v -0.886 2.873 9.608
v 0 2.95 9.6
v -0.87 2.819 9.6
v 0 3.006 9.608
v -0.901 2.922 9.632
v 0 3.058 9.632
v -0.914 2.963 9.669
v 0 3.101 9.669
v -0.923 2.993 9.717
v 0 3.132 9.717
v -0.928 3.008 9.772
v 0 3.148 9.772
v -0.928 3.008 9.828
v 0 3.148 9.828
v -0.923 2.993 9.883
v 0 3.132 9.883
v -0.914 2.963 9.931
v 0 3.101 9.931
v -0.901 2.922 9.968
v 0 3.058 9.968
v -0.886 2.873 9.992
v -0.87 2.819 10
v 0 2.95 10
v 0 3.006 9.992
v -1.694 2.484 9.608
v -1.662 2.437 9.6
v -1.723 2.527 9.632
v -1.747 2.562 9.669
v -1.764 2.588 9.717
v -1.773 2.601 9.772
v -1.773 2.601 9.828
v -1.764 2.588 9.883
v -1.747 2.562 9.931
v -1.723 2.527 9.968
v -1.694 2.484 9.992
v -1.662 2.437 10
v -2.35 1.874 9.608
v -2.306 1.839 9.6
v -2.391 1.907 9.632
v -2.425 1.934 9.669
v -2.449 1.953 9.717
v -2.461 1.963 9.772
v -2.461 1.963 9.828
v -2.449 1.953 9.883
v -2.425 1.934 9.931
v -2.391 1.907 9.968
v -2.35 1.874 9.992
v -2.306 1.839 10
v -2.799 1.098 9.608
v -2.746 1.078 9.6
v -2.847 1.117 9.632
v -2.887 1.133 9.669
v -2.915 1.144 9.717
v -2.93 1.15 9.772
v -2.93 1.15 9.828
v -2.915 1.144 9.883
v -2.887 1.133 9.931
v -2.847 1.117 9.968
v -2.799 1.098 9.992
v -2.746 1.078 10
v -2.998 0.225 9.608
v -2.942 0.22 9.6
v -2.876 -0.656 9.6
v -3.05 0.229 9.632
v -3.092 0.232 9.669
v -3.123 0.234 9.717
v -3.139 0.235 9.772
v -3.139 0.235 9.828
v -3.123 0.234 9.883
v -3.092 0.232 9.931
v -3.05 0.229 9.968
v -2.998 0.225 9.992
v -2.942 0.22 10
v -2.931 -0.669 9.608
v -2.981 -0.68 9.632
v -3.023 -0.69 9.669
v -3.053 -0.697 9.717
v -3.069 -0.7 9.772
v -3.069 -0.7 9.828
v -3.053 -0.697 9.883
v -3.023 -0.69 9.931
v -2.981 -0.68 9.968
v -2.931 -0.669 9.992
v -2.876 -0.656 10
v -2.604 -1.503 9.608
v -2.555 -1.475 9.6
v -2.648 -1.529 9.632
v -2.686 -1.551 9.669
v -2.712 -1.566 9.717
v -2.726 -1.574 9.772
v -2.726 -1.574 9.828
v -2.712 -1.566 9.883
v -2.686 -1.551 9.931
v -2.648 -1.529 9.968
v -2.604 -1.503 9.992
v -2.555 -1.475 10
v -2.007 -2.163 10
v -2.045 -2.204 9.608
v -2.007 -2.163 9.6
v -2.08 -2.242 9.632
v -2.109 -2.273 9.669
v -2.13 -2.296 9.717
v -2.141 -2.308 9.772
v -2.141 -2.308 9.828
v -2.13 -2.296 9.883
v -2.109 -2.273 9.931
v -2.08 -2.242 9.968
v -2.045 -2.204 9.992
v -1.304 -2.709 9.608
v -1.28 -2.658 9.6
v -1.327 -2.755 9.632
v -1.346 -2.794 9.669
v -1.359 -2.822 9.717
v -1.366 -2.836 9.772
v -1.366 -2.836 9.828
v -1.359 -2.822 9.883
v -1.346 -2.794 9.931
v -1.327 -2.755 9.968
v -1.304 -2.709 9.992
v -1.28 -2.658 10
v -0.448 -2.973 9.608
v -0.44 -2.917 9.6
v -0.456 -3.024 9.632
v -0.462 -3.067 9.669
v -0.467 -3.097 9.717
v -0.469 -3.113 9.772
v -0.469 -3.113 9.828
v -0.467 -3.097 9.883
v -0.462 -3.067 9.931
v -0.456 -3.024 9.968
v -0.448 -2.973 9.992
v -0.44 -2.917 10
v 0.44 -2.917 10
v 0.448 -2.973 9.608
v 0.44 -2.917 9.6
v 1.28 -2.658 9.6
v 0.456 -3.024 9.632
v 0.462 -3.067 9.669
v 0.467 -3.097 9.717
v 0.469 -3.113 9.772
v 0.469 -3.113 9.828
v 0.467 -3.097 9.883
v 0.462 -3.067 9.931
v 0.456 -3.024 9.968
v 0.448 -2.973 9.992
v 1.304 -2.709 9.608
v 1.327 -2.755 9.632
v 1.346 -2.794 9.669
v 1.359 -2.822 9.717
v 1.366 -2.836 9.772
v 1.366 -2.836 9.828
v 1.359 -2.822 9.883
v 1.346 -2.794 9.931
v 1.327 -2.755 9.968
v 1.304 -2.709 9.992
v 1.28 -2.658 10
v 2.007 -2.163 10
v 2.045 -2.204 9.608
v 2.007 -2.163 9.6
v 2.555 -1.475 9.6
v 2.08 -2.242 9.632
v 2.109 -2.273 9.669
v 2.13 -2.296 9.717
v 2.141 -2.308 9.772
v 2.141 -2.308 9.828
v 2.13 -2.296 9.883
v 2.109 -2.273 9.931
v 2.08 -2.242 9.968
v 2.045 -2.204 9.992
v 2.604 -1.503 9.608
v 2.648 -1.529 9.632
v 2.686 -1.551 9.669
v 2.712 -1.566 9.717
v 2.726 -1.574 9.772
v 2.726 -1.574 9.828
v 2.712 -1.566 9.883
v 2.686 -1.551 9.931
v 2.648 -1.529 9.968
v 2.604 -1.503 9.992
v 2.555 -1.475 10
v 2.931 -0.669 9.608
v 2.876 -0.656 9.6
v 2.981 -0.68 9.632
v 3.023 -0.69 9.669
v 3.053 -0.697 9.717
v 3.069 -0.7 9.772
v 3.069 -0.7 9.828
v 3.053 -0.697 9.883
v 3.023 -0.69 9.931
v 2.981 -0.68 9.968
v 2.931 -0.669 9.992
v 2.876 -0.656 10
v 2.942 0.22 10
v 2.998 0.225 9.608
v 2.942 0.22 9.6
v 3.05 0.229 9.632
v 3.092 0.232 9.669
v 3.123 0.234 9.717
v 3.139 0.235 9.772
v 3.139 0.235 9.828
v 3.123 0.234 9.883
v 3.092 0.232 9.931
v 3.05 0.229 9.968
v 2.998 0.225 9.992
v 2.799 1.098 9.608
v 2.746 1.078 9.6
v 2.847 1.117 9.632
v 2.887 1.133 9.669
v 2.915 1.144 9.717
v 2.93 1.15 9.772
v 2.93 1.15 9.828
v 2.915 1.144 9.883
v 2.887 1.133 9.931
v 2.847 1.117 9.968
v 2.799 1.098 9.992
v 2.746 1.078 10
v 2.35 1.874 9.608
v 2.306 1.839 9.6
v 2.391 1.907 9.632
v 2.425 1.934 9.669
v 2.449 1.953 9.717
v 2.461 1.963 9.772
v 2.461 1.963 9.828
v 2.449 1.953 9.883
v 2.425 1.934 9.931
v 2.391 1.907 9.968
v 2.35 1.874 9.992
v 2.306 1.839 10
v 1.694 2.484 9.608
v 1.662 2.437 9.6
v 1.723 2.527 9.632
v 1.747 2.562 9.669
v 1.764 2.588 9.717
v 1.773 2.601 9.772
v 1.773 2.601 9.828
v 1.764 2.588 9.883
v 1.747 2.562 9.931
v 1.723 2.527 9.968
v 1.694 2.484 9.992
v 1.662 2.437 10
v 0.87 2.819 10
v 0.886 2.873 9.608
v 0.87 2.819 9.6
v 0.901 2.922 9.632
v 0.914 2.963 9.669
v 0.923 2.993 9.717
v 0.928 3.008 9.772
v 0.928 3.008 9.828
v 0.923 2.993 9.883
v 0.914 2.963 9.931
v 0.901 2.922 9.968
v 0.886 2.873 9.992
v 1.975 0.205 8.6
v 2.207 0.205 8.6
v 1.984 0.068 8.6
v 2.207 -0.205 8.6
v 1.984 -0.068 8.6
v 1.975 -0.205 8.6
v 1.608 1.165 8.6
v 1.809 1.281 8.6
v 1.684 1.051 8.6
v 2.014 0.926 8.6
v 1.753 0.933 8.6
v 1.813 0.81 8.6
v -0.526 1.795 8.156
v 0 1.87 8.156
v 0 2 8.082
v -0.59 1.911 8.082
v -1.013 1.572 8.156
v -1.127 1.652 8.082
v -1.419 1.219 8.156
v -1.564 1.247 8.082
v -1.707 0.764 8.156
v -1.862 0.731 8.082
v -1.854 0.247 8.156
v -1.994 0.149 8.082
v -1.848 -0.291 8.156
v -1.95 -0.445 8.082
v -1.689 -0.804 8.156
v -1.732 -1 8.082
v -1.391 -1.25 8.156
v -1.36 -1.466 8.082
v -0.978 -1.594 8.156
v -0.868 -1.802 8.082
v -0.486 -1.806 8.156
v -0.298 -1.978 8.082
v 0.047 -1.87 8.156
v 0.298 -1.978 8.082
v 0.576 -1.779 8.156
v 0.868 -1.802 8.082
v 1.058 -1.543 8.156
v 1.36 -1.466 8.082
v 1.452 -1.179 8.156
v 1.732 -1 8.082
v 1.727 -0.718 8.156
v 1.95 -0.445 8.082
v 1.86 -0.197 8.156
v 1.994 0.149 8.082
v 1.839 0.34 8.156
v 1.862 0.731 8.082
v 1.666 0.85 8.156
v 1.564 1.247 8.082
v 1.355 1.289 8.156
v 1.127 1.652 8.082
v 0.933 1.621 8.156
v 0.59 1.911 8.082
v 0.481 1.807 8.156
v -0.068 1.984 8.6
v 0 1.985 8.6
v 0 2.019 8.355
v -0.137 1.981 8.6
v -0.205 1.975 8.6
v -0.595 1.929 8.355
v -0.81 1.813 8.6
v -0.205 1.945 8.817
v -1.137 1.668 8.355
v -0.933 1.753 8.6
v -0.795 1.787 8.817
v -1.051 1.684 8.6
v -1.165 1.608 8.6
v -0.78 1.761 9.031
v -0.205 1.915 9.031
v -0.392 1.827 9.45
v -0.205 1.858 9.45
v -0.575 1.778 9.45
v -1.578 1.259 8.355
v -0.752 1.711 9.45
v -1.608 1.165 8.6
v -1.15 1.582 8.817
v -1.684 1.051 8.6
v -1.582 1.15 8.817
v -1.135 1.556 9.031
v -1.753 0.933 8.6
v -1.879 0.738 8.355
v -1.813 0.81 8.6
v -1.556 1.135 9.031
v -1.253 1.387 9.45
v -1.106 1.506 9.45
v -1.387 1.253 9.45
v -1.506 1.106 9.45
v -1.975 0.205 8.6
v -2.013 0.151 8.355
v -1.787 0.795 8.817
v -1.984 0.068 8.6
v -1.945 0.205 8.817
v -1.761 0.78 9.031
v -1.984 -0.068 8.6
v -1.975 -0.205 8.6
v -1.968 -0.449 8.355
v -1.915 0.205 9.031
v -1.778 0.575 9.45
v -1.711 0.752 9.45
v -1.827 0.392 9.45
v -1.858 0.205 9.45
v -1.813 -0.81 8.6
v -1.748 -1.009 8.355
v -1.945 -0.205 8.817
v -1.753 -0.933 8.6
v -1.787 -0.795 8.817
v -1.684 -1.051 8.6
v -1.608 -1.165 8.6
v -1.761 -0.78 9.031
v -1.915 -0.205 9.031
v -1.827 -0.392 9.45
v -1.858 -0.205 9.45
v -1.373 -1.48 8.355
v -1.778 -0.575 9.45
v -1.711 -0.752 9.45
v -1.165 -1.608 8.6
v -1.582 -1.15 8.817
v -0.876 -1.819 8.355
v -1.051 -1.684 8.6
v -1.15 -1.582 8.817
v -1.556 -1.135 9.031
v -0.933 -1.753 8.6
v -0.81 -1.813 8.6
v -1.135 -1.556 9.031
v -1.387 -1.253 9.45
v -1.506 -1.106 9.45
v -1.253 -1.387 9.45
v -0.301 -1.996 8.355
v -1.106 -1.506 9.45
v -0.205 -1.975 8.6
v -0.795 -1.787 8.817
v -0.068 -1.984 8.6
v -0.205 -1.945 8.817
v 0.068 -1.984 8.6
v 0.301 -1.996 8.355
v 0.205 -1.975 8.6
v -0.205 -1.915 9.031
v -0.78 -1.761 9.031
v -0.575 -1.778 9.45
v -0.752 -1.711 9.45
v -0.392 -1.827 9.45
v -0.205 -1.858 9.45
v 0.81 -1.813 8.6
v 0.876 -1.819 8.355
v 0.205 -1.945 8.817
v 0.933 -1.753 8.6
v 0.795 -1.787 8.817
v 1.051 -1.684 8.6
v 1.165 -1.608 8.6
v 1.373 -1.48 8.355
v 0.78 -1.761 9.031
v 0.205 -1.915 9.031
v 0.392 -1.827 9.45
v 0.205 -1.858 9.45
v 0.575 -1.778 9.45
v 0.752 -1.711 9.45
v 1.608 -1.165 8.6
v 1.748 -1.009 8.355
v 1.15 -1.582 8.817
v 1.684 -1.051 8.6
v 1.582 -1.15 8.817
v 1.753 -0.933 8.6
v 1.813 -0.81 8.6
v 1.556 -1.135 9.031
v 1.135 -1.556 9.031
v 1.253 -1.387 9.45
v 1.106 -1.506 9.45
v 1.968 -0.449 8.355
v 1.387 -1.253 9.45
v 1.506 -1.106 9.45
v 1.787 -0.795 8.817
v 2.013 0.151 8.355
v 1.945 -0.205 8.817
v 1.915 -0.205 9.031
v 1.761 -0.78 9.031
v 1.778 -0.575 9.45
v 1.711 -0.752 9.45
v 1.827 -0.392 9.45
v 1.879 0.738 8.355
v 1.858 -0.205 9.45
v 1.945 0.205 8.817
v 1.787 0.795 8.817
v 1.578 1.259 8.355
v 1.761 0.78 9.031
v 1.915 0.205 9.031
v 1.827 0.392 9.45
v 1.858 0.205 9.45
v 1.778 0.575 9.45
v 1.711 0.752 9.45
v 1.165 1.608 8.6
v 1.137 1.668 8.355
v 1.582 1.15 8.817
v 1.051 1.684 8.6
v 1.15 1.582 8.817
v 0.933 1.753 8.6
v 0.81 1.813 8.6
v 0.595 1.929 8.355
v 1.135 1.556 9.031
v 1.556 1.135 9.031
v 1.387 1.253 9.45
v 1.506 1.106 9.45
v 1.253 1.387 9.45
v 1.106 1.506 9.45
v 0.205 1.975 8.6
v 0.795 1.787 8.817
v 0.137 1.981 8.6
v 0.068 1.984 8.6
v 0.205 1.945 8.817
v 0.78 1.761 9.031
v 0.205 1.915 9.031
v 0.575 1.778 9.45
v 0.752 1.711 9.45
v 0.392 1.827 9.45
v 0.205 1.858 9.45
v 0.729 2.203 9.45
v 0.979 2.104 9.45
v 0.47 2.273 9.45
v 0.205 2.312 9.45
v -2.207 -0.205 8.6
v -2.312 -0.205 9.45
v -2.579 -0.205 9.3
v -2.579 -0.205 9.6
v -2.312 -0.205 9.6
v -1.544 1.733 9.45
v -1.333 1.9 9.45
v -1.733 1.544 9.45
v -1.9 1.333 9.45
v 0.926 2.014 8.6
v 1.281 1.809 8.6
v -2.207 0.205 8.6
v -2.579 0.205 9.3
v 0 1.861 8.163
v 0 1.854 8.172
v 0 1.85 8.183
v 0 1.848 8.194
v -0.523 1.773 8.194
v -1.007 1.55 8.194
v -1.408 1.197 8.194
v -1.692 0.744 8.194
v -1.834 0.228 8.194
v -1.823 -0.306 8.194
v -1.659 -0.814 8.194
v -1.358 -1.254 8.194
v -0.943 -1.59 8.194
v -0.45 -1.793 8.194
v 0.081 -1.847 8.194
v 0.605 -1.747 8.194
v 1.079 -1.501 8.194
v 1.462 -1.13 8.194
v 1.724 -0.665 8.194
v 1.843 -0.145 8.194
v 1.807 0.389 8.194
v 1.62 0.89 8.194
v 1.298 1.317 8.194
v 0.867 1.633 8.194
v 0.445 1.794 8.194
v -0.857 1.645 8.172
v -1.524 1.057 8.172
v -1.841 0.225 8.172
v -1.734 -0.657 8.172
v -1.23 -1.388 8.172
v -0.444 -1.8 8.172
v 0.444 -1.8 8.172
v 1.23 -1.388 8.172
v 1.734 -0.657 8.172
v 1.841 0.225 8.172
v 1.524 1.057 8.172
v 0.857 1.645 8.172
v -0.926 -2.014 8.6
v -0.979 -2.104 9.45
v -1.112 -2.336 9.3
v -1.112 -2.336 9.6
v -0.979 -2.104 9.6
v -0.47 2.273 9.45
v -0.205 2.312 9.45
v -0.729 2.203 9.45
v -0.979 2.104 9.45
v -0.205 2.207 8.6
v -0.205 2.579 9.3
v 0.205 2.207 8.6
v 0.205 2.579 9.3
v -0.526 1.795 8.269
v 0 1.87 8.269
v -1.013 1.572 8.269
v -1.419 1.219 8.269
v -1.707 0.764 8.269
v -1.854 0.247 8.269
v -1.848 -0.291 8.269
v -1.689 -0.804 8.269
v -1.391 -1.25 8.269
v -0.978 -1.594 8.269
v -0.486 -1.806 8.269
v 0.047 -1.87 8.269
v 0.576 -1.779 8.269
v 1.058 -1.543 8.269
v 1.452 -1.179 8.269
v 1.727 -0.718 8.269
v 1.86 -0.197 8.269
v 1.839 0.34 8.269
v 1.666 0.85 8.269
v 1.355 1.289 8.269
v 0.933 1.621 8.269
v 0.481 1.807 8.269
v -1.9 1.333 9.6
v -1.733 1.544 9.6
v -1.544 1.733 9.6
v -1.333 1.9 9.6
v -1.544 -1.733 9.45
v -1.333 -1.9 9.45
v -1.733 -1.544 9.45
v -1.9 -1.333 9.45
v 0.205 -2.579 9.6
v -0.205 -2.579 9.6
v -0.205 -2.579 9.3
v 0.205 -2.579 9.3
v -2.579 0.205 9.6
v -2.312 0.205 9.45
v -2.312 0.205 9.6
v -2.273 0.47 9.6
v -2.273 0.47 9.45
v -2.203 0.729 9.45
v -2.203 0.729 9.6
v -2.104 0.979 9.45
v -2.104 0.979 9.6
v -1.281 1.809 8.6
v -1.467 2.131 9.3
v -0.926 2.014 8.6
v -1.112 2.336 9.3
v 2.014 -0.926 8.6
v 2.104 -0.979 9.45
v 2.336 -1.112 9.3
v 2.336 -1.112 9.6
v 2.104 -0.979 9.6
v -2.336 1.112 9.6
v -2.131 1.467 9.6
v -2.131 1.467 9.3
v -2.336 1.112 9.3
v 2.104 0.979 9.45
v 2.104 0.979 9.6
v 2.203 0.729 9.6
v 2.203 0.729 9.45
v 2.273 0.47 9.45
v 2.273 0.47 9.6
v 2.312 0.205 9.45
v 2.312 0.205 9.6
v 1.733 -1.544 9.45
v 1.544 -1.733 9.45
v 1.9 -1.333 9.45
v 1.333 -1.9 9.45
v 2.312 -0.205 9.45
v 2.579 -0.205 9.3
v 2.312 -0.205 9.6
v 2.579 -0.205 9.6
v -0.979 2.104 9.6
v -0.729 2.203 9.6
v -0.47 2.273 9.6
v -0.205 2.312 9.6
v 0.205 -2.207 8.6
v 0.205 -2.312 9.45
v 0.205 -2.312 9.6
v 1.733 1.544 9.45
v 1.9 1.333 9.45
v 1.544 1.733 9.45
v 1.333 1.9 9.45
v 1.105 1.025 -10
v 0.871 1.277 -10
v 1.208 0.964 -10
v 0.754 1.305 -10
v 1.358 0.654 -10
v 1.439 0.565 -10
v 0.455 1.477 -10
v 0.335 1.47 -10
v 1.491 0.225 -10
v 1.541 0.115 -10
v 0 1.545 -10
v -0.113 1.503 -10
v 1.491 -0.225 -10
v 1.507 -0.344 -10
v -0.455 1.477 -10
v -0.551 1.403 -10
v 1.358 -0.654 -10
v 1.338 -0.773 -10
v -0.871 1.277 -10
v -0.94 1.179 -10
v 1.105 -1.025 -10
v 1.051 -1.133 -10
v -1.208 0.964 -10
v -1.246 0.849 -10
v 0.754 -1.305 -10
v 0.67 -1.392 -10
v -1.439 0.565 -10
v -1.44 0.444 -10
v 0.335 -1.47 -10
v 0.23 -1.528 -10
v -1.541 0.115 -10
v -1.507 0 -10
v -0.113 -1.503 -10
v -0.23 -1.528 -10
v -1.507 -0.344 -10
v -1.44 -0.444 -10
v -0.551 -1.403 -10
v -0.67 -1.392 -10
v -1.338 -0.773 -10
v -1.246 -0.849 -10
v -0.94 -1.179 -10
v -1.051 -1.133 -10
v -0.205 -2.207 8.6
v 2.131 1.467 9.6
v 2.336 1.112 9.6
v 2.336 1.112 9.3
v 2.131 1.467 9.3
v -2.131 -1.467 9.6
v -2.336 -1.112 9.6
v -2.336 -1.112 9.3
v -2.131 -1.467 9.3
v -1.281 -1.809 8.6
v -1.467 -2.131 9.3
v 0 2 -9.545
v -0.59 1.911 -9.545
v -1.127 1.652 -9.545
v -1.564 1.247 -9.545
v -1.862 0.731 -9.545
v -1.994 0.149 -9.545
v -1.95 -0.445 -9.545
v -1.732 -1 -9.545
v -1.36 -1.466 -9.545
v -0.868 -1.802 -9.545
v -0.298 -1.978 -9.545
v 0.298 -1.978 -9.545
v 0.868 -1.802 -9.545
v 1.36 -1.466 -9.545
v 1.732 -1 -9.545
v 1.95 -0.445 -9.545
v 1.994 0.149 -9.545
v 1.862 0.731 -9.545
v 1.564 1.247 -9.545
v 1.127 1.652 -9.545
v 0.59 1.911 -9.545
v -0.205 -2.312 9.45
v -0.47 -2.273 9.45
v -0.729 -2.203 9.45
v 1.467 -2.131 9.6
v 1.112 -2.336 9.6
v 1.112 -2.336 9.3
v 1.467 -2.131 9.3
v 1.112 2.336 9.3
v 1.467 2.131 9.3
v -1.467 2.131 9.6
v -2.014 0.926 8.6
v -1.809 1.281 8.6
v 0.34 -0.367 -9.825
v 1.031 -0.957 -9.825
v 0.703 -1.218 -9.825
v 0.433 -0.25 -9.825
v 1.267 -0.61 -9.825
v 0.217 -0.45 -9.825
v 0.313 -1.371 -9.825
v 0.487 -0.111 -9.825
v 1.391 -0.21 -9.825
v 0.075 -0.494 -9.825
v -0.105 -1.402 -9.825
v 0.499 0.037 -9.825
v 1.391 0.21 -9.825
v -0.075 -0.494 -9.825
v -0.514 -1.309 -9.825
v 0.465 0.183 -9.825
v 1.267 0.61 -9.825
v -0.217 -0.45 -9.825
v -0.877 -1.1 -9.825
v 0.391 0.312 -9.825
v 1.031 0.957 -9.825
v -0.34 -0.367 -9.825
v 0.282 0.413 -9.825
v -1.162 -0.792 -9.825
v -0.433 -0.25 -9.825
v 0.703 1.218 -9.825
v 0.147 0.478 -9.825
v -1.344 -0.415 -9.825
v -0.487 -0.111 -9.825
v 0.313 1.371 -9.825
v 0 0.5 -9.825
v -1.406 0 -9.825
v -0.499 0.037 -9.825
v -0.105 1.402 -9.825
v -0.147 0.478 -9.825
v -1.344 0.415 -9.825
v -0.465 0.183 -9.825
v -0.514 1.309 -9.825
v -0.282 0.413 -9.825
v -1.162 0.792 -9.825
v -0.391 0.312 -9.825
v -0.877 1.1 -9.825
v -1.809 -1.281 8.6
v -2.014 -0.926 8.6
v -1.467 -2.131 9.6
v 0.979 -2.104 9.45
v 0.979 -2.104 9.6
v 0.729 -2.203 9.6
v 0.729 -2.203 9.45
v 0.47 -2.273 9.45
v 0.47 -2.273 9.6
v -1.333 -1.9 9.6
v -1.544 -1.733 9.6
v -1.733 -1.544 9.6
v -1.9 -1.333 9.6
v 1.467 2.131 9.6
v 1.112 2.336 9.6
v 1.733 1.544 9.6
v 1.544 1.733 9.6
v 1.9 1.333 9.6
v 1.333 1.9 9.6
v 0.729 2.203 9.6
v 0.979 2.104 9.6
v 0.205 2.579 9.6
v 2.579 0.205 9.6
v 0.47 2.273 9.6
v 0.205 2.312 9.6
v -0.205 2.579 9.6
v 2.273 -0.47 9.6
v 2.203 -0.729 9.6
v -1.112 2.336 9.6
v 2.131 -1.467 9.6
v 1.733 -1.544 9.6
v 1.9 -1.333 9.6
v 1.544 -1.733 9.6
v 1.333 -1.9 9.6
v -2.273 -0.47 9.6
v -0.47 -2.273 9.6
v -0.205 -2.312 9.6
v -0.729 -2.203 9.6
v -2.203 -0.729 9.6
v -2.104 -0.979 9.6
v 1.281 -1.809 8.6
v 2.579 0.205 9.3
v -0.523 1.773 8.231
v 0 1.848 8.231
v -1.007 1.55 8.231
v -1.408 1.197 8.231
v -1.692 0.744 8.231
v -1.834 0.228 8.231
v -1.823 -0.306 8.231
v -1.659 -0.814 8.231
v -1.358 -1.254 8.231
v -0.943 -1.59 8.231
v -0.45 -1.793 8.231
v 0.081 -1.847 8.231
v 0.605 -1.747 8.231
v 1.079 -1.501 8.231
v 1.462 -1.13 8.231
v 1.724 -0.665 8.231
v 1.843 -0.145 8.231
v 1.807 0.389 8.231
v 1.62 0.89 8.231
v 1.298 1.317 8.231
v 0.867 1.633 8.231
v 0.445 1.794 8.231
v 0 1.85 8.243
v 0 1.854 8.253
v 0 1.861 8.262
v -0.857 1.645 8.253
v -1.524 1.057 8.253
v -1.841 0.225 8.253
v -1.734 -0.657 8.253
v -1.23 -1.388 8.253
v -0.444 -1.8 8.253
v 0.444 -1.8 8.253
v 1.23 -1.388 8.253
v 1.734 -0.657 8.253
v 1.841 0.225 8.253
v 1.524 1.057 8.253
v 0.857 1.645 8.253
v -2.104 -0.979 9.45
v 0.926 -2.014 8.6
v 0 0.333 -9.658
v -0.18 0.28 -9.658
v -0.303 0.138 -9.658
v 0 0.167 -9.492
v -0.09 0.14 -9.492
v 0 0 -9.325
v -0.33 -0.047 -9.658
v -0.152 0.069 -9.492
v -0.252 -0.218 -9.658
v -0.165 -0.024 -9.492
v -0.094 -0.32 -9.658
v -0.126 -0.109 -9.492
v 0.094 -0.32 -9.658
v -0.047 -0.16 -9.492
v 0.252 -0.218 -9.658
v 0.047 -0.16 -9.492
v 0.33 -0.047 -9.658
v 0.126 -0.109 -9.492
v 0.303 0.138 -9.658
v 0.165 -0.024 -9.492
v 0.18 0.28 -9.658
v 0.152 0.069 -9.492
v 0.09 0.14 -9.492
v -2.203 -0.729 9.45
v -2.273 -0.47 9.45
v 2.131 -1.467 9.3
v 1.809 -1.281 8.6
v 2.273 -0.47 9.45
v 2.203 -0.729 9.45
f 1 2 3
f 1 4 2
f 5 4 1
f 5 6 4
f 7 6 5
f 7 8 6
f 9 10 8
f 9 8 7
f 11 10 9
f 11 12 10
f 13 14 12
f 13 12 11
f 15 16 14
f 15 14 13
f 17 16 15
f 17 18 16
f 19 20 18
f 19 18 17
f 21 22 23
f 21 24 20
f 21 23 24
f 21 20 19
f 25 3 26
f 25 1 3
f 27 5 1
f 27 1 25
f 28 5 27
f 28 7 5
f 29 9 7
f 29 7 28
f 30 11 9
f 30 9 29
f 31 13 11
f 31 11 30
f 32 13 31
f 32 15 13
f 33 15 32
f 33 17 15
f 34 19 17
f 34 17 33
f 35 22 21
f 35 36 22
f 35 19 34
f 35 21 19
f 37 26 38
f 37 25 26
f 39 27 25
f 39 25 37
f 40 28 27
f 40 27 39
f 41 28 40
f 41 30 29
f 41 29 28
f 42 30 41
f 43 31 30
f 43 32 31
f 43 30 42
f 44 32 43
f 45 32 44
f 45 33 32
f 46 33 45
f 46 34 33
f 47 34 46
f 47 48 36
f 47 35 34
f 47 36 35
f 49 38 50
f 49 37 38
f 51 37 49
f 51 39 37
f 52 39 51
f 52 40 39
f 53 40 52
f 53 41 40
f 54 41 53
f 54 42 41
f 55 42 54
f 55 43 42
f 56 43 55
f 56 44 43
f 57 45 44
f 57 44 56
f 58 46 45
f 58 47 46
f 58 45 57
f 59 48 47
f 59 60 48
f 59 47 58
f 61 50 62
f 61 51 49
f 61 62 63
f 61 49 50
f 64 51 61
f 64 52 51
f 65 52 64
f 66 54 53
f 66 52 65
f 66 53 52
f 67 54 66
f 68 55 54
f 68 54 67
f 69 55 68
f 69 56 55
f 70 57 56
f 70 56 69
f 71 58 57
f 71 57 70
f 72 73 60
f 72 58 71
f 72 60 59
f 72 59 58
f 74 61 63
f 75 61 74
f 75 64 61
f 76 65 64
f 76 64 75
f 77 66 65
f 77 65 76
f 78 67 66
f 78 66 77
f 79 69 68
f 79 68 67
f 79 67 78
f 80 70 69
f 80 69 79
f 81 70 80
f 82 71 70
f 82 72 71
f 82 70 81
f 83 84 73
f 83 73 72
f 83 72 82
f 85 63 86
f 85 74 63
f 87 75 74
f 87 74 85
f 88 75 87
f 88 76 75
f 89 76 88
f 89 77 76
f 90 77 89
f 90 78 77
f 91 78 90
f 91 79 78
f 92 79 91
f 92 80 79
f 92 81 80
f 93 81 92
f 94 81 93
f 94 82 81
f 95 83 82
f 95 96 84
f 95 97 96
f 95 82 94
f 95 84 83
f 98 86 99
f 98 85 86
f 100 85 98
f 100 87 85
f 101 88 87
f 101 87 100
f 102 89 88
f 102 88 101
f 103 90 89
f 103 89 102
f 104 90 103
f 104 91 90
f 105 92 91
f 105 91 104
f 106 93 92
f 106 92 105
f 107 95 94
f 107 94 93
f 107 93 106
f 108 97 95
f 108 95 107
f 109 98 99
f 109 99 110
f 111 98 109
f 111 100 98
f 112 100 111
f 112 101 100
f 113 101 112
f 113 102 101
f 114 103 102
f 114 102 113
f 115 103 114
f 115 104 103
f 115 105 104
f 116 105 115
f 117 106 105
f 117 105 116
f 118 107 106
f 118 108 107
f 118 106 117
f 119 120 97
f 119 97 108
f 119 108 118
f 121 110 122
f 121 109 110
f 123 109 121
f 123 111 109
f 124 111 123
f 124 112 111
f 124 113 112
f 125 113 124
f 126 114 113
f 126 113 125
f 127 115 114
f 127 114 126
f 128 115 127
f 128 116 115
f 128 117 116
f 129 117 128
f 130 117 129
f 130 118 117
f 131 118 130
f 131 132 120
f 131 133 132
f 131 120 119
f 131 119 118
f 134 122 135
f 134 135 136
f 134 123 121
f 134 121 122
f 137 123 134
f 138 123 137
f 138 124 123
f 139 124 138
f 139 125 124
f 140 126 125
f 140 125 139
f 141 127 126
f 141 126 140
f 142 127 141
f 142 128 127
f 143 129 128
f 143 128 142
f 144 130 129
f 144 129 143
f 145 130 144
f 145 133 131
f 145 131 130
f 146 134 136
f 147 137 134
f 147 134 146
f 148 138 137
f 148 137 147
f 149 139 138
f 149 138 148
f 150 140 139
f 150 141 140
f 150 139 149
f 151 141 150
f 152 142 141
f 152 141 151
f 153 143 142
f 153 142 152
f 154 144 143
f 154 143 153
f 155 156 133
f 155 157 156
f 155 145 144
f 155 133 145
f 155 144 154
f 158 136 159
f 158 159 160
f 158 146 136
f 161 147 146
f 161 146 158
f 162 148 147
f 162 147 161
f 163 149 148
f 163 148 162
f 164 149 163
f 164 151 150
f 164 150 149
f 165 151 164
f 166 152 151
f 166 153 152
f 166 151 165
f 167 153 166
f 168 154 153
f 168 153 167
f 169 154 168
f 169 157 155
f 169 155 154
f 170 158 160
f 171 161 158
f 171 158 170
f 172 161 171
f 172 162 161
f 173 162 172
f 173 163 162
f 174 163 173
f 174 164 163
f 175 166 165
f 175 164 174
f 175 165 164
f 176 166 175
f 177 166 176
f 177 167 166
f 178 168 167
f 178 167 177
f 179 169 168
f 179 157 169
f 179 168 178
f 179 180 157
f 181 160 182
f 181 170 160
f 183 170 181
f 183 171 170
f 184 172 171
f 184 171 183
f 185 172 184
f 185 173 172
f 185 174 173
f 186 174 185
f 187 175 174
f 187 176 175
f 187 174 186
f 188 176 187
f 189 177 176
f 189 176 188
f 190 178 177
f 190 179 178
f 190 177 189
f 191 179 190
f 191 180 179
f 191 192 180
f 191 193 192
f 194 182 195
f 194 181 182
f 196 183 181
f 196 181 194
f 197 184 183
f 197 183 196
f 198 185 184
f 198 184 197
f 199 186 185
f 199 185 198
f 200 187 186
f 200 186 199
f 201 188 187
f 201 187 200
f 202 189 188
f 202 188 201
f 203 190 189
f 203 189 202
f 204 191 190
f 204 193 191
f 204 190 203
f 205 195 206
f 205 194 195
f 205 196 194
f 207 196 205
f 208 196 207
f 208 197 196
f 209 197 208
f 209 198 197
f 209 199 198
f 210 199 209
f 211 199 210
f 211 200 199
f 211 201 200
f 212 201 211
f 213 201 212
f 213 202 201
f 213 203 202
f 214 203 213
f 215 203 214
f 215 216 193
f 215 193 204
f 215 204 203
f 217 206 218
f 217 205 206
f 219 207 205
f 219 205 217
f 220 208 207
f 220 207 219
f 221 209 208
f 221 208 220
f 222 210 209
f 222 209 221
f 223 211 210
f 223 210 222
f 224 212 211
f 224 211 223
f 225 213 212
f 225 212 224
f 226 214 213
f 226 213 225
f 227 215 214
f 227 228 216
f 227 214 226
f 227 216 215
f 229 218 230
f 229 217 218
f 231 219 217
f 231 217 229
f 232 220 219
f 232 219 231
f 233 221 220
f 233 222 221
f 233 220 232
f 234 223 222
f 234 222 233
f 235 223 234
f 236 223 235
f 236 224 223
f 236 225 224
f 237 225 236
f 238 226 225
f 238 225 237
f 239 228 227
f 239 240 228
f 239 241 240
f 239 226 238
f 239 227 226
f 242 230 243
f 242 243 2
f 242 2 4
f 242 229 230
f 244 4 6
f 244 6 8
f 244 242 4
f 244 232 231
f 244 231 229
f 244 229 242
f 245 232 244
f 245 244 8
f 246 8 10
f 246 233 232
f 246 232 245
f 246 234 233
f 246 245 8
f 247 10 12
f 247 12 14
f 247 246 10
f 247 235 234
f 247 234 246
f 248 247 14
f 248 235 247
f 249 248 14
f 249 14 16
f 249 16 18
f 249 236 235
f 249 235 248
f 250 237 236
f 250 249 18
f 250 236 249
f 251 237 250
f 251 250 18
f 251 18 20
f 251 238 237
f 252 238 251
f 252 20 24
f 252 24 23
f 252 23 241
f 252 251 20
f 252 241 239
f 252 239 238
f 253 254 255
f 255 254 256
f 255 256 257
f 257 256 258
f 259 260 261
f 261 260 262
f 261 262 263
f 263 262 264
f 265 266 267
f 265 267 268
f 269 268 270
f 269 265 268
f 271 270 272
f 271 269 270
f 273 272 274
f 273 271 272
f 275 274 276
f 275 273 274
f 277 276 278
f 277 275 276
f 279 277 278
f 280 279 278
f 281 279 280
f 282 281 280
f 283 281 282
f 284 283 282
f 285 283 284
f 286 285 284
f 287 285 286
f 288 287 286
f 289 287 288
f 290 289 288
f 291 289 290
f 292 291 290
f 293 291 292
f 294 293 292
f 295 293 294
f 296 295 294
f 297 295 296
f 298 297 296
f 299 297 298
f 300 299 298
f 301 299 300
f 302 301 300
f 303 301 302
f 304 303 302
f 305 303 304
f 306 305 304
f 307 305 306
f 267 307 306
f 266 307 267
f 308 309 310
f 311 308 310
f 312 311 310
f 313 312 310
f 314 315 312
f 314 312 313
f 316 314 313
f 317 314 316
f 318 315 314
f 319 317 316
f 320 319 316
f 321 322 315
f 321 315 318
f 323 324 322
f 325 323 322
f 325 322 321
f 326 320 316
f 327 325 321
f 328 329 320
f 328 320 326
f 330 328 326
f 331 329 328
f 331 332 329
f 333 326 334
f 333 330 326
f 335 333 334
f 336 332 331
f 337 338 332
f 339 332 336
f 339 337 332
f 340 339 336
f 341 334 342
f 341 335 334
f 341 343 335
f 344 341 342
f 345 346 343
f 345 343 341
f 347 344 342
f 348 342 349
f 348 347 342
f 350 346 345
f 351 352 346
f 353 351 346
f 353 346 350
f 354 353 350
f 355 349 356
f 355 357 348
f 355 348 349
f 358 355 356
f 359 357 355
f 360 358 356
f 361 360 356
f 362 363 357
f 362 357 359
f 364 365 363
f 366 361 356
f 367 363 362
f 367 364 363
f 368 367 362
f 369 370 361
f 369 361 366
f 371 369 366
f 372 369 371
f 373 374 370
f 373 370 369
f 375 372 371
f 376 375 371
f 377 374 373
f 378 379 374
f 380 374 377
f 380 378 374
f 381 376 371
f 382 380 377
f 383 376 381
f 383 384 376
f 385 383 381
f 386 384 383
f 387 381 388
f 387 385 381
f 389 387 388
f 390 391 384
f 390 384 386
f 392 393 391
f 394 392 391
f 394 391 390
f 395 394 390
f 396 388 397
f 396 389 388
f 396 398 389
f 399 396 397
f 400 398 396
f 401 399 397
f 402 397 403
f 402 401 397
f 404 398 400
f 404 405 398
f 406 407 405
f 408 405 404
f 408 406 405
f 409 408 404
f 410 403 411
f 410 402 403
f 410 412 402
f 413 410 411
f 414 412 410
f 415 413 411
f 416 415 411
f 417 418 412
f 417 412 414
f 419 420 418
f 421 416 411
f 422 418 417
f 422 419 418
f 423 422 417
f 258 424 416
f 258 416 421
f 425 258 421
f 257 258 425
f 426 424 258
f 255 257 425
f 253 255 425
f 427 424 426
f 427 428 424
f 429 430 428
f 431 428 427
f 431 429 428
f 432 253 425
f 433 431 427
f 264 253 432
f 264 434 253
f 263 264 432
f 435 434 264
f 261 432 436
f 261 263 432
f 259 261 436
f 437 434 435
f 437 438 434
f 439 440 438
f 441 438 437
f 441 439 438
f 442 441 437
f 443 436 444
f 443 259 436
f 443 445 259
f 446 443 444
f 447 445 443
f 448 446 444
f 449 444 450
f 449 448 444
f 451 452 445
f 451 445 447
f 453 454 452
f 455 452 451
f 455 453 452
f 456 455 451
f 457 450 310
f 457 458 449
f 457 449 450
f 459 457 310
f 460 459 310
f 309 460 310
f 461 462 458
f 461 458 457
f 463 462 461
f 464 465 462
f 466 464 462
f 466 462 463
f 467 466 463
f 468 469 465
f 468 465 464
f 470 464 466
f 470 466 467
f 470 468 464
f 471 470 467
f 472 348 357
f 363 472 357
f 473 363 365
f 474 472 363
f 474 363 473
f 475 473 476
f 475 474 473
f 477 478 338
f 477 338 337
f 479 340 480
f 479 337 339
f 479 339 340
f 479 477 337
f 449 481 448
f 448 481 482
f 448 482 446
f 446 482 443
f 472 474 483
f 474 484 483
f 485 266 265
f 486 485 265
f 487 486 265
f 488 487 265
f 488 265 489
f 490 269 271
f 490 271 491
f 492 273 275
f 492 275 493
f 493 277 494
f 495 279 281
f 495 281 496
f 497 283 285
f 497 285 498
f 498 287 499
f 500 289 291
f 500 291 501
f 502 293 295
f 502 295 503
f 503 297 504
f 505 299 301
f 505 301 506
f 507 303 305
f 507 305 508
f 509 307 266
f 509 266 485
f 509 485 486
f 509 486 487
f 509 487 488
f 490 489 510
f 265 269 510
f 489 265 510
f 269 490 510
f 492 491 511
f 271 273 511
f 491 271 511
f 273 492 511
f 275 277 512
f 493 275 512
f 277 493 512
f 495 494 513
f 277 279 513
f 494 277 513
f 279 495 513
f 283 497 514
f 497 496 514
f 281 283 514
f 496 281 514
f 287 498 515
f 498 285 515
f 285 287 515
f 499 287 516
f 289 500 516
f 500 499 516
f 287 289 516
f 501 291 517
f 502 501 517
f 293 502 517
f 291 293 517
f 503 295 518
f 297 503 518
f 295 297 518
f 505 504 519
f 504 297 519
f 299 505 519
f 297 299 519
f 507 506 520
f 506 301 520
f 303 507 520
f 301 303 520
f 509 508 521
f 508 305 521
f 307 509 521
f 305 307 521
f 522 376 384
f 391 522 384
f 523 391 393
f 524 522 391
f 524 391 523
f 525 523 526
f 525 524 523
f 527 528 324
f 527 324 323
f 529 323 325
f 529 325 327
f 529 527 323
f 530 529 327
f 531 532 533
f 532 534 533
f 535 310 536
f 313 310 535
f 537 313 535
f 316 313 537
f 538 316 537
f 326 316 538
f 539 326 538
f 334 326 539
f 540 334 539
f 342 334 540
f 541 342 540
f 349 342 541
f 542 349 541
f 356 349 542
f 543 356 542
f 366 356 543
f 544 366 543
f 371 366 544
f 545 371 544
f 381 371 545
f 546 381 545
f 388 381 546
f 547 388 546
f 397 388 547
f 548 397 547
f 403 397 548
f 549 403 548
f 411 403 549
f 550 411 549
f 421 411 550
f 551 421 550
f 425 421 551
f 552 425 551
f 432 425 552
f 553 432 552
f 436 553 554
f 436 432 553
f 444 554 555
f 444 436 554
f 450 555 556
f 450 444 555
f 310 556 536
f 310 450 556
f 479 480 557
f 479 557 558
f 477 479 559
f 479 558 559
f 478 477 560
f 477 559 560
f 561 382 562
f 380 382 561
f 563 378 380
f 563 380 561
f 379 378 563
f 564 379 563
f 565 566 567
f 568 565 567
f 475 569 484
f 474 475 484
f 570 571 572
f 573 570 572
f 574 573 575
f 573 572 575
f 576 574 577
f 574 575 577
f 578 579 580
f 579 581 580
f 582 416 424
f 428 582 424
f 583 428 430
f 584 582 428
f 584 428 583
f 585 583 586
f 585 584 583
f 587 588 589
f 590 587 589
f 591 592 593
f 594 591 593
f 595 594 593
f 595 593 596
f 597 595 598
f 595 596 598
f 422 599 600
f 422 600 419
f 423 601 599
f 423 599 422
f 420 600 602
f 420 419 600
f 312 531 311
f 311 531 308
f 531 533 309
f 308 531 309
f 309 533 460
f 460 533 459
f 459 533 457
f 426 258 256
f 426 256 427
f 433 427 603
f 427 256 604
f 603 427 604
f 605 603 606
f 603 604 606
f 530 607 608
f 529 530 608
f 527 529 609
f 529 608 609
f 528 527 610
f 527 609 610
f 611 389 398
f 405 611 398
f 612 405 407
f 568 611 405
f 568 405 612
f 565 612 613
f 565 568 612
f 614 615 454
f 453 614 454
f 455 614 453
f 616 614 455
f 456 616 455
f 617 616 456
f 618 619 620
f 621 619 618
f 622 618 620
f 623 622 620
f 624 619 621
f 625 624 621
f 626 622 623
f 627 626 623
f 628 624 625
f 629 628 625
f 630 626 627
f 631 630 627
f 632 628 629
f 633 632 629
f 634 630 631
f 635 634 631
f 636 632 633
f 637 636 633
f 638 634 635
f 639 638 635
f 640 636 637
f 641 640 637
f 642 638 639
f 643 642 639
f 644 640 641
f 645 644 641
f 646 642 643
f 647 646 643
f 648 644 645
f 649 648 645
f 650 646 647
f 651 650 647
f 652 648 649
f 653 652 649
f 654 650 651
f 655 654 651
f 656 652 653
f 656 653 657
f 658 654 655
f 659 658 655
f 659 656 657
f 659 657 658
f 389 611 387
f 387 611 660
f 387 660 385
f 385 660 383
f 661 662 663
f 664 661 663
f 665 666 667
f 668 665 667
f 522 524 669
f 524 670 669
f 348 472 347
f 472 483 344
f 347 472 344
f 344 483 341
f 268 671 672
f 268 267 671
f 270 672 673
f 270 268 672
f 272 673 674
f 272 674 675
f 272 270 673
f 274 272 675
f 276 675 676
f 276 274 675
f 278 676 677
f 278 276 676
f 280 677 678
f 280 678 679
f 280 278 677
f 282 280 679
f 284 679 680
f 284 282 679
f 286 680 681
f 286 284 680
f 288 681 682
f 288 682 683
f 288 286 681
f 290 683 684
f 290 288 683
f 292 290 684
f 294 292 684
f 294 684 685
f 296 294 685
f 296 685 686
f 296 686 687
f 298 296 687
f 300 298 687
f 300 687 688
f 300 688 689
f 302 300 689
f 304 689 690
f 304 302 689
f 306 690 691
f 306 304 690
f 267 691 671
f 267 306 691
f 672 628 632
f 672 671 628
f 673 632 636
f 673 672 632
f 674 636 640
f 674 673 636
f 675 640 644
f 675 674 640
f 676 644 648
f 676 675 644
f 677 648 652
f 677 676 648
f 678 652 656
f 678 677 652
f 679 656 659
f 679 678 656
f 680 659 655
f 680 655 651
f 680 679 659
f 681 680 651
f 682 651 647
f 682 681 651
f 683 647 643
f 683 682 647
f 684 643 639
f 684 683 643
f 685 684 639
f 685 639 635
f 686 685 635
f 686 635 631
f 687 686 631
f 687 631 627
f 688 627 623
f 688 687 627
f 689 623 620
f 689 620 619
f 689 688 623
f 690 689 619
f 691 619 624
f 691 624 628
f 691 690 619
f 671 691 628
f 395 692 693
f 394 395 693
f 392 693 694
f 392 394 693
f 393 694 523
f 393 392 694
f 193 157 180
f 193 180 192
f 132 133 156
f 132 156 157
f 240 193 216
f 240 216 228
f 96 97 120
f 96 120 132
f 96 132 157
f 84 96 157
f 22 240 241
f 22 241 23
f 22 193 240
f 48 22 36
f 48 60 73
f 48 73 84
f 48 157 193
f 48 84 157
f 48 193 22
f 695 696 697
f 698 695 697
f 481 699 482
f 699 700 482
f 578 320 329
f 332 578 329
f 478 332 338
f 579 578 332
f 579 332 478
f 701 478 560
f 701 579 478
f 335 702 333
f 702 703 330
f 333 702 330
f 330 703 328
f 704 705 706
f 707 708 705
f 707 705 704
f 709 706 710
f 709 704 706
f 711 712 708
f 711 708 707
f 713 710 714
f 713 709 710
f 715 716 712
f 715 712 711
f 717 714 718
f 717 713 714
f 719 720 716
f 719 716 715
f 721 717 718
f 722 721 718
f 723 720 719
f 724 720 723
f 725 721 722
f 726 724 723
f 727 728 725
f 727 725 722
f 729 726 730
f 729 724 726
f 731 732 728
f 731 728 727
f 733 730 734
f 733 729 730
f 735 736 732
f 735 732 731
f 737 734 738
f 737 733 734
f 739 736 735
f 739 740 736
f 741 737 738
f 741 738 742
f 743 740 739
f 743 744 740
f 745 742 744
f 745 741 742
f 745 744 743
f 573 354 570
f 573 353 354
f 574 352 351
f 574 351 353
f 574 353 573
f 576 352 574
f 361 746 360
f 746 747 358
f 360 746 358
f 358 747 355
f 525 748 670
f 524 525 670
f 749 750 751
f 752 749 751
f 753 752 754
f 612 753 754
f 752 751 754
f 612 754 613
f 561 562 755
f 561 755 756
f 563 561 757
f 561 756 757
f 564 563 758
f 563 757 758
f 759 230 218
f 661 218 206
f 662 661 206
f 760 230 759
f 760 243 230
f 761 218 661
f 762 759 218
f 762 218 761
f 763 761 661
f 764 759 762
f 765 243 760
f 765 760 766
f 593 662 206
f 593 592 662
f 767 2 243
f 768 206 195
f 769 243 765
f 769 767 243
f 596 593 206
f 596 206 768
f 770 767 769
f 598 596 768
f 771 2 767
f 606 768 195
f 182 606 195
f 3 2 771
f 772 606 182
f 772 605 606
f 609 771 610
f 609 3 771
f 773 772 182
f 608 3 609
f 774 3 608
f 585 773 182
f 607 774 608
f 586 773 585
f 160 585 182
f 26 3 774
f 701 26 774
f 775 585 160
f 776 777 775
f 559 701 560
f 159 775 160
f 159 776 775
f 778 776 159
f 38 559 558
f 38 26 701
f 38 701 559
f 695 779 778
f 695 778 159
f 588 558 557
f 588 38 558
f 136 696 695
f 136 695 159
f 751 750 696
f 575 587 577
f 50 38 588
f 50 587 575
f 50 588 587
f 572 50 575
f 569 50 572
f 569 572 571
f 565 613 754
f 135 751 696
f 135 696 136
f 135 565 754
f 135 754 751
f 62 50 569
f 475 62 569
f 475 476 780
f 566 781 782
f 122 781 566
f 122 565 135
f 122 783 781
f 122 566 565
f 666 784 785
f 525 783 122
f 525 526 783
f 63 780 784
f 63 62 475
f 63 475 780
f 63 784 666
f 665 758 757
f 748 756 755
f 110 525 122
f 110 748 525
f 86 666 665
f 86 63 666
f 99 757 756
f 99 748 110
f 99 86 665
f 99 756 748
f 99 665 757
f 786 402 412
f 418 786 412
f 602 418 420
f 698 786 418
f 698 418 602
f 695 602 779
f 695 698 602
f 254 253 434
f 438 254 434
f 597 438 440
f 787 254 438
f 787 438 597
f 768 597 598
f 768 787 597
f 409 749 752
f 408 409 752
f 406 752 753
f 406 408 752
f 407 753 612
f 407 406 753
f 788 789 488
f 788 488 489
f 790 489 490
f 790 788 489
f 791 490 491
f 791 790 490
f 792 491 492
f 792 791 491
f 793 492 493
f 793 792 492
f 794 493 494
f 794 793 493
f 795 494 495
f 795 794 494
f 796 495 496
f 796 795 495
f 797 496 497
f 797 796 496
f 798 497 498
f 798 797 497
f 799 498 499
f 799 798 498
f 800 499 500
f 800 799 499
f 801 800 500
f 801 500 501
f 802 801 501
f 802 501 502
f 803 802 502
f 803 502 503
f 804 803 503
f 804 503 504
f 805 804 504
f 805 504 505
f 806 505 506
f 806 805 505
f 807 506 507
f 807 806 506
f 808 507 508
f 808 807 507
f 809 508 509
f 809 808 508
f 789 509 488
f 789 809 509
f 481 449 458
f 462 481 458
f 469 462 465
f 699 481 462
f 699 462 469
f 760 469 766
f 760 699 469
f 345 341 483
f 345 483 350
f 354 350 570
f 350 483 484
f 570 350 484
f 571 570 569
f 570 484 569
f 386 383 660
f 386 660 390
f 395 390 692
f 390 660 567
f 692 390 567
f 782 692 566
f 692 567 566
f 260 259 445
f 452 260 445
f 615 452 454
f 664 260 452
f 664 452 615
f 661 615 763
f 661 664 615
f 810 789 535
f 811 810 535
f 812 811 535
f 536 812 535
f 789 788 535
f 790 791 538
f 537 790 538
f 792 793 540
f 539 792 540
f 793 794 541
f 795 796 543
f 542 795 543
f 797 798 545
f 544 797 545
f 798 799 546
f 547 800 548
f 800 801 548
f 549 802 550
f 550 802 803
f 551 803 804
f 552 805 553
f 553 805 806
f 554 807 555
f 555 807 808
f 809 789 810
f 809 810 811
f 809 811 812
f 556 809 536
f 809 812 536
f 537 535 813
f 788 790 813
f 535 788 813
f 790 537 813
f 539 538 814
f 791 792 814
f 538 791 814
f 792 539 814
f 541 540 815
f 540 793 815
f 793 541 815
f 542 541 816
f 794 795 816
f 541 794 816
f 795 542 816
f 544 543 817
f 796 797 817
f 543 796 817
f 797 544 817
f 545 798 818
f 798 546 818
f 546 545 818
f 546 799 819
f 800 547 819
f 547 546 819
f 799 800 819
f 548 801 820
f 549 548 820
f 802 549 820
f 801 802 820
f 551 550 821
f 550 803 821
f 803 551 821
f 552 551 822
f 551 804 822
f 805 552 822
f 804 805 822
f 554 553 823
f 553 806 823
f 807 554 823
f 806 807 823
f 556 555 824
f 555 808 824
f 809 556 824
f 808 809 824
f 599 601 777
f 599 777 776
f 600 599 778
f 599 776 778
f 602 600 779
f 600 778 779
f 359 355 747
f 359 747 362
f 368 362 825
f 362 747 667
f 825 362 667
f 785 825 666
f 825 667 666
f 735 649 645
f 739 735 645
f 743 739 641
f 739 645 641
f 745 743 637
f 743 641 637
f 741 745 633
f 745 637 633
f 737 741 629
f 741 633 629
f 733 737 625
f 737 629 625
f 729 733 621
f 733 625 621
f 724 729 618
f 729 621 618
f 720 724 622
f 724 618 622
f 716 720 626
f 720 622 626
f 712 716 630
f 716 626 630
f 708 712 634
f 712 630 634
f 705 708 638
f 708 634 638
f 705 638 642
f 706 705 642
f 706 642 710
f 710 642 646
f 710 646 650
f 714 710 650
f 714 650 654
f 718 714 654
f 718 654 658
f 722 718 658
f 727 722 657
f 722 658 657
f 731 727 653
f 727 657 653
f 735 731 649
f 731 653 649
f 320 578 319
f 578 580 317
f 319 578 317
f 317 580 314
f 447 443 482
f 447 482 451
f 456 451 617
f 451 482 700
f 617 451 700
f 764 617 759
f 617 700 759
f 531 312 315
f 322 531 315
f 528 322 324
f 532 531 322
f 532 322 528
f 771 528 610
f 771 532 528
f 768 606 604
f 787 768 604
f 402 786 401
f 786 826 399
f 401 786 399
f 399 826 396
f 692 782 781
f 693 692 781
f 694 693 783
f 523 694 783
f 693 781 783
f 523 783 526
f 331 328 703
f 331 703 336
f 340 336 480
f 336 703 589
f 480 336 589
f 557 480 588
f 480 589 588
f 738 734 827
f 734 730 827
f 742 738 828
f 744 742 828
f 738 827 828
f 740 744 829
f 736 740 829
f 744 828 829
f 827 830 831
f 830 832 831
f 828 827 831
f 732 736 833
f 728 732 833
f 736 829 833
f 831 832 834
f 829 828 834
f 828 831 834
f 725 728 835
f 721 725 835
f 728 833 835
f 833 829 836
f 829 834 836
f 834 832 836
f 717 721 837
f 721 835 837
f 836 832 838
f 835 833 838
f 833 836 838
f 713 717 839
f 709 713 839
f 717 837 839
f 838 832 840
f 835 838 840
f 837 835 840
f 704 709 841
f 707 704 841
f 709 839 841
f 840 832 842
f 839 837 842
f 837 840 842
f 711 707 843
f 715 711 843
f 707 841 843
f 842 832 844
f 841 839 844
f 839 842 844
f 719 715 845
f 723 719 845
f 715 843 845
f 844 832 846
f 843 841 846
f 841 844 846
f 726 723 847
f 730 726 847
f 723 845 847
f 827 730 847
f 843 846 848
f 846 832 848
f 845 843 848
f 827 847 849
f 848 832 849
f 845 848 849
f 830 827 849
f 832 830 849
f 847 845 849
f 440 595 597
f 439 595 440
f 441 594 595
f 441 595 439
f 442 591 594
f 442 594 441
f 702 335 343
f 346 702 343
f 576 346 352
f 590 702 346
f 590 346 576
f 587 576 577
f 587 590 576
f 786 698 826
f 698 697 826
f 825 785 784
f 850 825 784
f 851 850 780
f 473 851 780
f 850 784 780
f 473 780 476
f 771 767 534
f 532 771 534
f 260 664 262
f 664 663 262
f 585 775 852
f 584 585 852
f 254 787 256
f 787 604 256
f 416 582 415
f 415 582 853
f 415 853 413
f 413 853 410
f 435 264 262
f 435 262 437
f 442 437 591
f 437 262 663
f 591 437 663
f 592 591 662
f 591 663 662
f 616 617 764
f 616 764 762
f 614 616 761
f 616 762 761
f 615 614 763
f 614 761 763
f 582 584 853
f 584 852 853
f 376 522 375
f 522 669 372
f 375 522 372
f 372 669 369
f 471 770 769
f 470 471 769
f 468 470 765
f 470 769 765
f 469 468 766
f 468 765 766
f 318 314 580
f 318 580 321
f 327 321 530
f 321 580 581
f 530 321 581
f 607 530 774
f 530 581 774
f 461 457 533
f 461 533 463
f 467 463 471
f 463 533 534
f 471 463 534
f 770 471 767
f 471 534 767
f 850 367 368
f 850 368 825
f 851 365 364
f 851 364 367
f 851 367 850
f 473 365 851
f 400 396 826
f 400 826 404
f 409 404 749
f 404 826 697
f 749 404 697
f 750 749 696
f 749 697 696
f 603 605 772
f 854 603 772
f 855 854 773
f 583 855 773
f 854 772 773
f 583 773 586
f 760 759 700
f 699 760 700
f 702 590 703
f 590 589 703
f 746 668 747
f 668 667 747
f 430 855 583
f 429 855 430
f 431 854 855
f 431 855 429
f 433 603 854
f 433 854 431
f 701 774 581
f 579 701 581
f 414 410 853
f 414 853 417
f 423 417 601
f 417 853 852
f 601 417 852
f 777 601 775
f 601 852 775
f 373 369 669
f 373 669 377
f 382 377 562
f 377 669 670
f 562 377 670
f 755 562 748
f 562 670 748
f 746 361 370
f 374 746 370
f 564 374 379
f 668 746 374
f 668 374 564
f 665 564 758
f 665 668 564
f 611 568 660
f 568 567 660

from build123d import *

# Parameters (mm, degrees)
FILLET2_R           = 0.04375
SKETCH16_R          = 1.507448052
CUT_EXTRUDE3_DEPTH  = 0.175
CUT_EXTRUDE3_DRAFT  = -30
BOSS_EXTRUDE1_DEPTH = 0.20475
CIRPATTERN3_COUNT   = 12
SKETCH14_R          = 2.320854115
BOSS_EXTRUDE3_DEPTH = 0.15


with BuildPart() as part:
    # Sketch7 → Revolve3 (revolve)
    with BuildSketch(Plane(origin=(0, 0, 0), x_dir=(0, 0, -1), z_dir=(1, 0, 0))):
        with BuildLine():
            Line((10, 1.545336663), (9.545336663, 2))
            Line((9.545336663, 2), (-8.0815625, 2))
            Line((-8.0815625, 2), (-8.1690625, 1.848445554))
            Line((-8.1690625, 1.848445554), (-8.2565625, 1.848445554))
            Line((-8.2565625, 1.848445554), (-8.355, 2.018944306))
            Line((-8.355, 2.018944306), (-9.6, 1.848445554))
            Line((-9.6, 1.848445554), (-9.6, 2))
            Line((-9.6, 2), (-9.6, 2.95))
            ThreePointArc((-9.6, 2.95), (-9.8, 3.15), (-10, 2.95))
            Line((-10, 2.95), (-10, 0))
            Line((-10, 0), (10, 0))
            Line((10, 0), (10, 1.545336663))
        make_face()
    revolve(axis=Axis((0, 0, -10), (0, 0, 1)))

    # Fillet2
    fillet2_edges = [part.edges().sort_by_distance(p)[0] for p in [
        (0, -1.848445554, 8.2565625),
        (0, -1.848445554, 8.1690625),
    ]]
    fillet(fillet2_edges, radius=FILLET2_R)


with BuildPart() as cut_extrude3_tool:
    # Sketch16 → Cut-Extrude3 (with draft: the straight prism first)
    with BuildSketch(Plane(origin=(0, 0, -10), x_dir=(-1, 0, 0), z_dir=(0, 0, -1))):
        Circle(SKETCH16_R)
    extrude(amount=-CUT_EXTRUDE3_DEPTH)
    # Cut-Extrude3: the draft: its side faces are tilted about the plane it starts from
    cut_extrude3_sides = [cut_extrude3_tool.faces().sort_by_distance(p)[0] for p in [
        (1.507448052, 0, -9.9125),
    ]]
    draft(cut_extrude3_sides, Plane(origin=(0, 0, -10), x_dir=(-1, 0, 0), z_dir=(0, 0, -1)), CUT_EXTRUDE3_DRAFT)


with BuildPart() as part_1:
    add(part.part)

    # Cut-Extrude3: cut by cut_extrude3_tool
    add(cut_extrude3_tool.part, mode=Mode.SUBTRACT)

    # Cut-Extrude1 cone 1 section (through the dimple's axis) → Cut-Extrude1 (revolve, cut)
    with BuildSketch(Plane(origin=(0, 0, -9.825), x_dir=(0, 1, 0), z_dir=(1, 0, 0))):
        Polygon((0, 0), (0.5, 0), (0, 0.5), align=None)
    revolve(axis=Axis((0, 0, -9.825), (0, 0, 1)), mode=Mode.SUBTRACT)

    # Sketch9 → Boss-Extrude1 (add, symmetric)
    with BuildSketch(Plane(origin=(0, 0, 0), x_dir=(0, 0, -1), z_dir=(1, 0, 0))):
        Polygon((-9.6, 2.578726794), (-9.3, 2.578726794), (-8.6, 2.207453588), (-8.6, 0), (-9.6, 0), align=None)
    boss_extrude1 = extrude(amount=BOSS_EXTRUDE1_DEPTH, both=True)

    # CirPattern3: Boss-Extrude1 ×12 about axis
    cirpattern3_axis = Axis((0, 0, 0), (0, 0, 1))
    for i in range(1, CIRPATTERN3_COUNT):
        add(boss_extrude1.rotate(cirpattern3_axis, i * 360 / CIRPATTERN3_COUNT))

    # Sketch14 → Boss-Extrude3 (add)
    with BuildSketch(Plane(origin=(0, 0, 9.6), x_dir=(-1, 0, 0), z_dir=(0, 0, -1))):
        Circle(SKETCH14_R)
    extrude(amount=BOSS_EXTRUDE3_DEPTH)


solid = part_1.part
